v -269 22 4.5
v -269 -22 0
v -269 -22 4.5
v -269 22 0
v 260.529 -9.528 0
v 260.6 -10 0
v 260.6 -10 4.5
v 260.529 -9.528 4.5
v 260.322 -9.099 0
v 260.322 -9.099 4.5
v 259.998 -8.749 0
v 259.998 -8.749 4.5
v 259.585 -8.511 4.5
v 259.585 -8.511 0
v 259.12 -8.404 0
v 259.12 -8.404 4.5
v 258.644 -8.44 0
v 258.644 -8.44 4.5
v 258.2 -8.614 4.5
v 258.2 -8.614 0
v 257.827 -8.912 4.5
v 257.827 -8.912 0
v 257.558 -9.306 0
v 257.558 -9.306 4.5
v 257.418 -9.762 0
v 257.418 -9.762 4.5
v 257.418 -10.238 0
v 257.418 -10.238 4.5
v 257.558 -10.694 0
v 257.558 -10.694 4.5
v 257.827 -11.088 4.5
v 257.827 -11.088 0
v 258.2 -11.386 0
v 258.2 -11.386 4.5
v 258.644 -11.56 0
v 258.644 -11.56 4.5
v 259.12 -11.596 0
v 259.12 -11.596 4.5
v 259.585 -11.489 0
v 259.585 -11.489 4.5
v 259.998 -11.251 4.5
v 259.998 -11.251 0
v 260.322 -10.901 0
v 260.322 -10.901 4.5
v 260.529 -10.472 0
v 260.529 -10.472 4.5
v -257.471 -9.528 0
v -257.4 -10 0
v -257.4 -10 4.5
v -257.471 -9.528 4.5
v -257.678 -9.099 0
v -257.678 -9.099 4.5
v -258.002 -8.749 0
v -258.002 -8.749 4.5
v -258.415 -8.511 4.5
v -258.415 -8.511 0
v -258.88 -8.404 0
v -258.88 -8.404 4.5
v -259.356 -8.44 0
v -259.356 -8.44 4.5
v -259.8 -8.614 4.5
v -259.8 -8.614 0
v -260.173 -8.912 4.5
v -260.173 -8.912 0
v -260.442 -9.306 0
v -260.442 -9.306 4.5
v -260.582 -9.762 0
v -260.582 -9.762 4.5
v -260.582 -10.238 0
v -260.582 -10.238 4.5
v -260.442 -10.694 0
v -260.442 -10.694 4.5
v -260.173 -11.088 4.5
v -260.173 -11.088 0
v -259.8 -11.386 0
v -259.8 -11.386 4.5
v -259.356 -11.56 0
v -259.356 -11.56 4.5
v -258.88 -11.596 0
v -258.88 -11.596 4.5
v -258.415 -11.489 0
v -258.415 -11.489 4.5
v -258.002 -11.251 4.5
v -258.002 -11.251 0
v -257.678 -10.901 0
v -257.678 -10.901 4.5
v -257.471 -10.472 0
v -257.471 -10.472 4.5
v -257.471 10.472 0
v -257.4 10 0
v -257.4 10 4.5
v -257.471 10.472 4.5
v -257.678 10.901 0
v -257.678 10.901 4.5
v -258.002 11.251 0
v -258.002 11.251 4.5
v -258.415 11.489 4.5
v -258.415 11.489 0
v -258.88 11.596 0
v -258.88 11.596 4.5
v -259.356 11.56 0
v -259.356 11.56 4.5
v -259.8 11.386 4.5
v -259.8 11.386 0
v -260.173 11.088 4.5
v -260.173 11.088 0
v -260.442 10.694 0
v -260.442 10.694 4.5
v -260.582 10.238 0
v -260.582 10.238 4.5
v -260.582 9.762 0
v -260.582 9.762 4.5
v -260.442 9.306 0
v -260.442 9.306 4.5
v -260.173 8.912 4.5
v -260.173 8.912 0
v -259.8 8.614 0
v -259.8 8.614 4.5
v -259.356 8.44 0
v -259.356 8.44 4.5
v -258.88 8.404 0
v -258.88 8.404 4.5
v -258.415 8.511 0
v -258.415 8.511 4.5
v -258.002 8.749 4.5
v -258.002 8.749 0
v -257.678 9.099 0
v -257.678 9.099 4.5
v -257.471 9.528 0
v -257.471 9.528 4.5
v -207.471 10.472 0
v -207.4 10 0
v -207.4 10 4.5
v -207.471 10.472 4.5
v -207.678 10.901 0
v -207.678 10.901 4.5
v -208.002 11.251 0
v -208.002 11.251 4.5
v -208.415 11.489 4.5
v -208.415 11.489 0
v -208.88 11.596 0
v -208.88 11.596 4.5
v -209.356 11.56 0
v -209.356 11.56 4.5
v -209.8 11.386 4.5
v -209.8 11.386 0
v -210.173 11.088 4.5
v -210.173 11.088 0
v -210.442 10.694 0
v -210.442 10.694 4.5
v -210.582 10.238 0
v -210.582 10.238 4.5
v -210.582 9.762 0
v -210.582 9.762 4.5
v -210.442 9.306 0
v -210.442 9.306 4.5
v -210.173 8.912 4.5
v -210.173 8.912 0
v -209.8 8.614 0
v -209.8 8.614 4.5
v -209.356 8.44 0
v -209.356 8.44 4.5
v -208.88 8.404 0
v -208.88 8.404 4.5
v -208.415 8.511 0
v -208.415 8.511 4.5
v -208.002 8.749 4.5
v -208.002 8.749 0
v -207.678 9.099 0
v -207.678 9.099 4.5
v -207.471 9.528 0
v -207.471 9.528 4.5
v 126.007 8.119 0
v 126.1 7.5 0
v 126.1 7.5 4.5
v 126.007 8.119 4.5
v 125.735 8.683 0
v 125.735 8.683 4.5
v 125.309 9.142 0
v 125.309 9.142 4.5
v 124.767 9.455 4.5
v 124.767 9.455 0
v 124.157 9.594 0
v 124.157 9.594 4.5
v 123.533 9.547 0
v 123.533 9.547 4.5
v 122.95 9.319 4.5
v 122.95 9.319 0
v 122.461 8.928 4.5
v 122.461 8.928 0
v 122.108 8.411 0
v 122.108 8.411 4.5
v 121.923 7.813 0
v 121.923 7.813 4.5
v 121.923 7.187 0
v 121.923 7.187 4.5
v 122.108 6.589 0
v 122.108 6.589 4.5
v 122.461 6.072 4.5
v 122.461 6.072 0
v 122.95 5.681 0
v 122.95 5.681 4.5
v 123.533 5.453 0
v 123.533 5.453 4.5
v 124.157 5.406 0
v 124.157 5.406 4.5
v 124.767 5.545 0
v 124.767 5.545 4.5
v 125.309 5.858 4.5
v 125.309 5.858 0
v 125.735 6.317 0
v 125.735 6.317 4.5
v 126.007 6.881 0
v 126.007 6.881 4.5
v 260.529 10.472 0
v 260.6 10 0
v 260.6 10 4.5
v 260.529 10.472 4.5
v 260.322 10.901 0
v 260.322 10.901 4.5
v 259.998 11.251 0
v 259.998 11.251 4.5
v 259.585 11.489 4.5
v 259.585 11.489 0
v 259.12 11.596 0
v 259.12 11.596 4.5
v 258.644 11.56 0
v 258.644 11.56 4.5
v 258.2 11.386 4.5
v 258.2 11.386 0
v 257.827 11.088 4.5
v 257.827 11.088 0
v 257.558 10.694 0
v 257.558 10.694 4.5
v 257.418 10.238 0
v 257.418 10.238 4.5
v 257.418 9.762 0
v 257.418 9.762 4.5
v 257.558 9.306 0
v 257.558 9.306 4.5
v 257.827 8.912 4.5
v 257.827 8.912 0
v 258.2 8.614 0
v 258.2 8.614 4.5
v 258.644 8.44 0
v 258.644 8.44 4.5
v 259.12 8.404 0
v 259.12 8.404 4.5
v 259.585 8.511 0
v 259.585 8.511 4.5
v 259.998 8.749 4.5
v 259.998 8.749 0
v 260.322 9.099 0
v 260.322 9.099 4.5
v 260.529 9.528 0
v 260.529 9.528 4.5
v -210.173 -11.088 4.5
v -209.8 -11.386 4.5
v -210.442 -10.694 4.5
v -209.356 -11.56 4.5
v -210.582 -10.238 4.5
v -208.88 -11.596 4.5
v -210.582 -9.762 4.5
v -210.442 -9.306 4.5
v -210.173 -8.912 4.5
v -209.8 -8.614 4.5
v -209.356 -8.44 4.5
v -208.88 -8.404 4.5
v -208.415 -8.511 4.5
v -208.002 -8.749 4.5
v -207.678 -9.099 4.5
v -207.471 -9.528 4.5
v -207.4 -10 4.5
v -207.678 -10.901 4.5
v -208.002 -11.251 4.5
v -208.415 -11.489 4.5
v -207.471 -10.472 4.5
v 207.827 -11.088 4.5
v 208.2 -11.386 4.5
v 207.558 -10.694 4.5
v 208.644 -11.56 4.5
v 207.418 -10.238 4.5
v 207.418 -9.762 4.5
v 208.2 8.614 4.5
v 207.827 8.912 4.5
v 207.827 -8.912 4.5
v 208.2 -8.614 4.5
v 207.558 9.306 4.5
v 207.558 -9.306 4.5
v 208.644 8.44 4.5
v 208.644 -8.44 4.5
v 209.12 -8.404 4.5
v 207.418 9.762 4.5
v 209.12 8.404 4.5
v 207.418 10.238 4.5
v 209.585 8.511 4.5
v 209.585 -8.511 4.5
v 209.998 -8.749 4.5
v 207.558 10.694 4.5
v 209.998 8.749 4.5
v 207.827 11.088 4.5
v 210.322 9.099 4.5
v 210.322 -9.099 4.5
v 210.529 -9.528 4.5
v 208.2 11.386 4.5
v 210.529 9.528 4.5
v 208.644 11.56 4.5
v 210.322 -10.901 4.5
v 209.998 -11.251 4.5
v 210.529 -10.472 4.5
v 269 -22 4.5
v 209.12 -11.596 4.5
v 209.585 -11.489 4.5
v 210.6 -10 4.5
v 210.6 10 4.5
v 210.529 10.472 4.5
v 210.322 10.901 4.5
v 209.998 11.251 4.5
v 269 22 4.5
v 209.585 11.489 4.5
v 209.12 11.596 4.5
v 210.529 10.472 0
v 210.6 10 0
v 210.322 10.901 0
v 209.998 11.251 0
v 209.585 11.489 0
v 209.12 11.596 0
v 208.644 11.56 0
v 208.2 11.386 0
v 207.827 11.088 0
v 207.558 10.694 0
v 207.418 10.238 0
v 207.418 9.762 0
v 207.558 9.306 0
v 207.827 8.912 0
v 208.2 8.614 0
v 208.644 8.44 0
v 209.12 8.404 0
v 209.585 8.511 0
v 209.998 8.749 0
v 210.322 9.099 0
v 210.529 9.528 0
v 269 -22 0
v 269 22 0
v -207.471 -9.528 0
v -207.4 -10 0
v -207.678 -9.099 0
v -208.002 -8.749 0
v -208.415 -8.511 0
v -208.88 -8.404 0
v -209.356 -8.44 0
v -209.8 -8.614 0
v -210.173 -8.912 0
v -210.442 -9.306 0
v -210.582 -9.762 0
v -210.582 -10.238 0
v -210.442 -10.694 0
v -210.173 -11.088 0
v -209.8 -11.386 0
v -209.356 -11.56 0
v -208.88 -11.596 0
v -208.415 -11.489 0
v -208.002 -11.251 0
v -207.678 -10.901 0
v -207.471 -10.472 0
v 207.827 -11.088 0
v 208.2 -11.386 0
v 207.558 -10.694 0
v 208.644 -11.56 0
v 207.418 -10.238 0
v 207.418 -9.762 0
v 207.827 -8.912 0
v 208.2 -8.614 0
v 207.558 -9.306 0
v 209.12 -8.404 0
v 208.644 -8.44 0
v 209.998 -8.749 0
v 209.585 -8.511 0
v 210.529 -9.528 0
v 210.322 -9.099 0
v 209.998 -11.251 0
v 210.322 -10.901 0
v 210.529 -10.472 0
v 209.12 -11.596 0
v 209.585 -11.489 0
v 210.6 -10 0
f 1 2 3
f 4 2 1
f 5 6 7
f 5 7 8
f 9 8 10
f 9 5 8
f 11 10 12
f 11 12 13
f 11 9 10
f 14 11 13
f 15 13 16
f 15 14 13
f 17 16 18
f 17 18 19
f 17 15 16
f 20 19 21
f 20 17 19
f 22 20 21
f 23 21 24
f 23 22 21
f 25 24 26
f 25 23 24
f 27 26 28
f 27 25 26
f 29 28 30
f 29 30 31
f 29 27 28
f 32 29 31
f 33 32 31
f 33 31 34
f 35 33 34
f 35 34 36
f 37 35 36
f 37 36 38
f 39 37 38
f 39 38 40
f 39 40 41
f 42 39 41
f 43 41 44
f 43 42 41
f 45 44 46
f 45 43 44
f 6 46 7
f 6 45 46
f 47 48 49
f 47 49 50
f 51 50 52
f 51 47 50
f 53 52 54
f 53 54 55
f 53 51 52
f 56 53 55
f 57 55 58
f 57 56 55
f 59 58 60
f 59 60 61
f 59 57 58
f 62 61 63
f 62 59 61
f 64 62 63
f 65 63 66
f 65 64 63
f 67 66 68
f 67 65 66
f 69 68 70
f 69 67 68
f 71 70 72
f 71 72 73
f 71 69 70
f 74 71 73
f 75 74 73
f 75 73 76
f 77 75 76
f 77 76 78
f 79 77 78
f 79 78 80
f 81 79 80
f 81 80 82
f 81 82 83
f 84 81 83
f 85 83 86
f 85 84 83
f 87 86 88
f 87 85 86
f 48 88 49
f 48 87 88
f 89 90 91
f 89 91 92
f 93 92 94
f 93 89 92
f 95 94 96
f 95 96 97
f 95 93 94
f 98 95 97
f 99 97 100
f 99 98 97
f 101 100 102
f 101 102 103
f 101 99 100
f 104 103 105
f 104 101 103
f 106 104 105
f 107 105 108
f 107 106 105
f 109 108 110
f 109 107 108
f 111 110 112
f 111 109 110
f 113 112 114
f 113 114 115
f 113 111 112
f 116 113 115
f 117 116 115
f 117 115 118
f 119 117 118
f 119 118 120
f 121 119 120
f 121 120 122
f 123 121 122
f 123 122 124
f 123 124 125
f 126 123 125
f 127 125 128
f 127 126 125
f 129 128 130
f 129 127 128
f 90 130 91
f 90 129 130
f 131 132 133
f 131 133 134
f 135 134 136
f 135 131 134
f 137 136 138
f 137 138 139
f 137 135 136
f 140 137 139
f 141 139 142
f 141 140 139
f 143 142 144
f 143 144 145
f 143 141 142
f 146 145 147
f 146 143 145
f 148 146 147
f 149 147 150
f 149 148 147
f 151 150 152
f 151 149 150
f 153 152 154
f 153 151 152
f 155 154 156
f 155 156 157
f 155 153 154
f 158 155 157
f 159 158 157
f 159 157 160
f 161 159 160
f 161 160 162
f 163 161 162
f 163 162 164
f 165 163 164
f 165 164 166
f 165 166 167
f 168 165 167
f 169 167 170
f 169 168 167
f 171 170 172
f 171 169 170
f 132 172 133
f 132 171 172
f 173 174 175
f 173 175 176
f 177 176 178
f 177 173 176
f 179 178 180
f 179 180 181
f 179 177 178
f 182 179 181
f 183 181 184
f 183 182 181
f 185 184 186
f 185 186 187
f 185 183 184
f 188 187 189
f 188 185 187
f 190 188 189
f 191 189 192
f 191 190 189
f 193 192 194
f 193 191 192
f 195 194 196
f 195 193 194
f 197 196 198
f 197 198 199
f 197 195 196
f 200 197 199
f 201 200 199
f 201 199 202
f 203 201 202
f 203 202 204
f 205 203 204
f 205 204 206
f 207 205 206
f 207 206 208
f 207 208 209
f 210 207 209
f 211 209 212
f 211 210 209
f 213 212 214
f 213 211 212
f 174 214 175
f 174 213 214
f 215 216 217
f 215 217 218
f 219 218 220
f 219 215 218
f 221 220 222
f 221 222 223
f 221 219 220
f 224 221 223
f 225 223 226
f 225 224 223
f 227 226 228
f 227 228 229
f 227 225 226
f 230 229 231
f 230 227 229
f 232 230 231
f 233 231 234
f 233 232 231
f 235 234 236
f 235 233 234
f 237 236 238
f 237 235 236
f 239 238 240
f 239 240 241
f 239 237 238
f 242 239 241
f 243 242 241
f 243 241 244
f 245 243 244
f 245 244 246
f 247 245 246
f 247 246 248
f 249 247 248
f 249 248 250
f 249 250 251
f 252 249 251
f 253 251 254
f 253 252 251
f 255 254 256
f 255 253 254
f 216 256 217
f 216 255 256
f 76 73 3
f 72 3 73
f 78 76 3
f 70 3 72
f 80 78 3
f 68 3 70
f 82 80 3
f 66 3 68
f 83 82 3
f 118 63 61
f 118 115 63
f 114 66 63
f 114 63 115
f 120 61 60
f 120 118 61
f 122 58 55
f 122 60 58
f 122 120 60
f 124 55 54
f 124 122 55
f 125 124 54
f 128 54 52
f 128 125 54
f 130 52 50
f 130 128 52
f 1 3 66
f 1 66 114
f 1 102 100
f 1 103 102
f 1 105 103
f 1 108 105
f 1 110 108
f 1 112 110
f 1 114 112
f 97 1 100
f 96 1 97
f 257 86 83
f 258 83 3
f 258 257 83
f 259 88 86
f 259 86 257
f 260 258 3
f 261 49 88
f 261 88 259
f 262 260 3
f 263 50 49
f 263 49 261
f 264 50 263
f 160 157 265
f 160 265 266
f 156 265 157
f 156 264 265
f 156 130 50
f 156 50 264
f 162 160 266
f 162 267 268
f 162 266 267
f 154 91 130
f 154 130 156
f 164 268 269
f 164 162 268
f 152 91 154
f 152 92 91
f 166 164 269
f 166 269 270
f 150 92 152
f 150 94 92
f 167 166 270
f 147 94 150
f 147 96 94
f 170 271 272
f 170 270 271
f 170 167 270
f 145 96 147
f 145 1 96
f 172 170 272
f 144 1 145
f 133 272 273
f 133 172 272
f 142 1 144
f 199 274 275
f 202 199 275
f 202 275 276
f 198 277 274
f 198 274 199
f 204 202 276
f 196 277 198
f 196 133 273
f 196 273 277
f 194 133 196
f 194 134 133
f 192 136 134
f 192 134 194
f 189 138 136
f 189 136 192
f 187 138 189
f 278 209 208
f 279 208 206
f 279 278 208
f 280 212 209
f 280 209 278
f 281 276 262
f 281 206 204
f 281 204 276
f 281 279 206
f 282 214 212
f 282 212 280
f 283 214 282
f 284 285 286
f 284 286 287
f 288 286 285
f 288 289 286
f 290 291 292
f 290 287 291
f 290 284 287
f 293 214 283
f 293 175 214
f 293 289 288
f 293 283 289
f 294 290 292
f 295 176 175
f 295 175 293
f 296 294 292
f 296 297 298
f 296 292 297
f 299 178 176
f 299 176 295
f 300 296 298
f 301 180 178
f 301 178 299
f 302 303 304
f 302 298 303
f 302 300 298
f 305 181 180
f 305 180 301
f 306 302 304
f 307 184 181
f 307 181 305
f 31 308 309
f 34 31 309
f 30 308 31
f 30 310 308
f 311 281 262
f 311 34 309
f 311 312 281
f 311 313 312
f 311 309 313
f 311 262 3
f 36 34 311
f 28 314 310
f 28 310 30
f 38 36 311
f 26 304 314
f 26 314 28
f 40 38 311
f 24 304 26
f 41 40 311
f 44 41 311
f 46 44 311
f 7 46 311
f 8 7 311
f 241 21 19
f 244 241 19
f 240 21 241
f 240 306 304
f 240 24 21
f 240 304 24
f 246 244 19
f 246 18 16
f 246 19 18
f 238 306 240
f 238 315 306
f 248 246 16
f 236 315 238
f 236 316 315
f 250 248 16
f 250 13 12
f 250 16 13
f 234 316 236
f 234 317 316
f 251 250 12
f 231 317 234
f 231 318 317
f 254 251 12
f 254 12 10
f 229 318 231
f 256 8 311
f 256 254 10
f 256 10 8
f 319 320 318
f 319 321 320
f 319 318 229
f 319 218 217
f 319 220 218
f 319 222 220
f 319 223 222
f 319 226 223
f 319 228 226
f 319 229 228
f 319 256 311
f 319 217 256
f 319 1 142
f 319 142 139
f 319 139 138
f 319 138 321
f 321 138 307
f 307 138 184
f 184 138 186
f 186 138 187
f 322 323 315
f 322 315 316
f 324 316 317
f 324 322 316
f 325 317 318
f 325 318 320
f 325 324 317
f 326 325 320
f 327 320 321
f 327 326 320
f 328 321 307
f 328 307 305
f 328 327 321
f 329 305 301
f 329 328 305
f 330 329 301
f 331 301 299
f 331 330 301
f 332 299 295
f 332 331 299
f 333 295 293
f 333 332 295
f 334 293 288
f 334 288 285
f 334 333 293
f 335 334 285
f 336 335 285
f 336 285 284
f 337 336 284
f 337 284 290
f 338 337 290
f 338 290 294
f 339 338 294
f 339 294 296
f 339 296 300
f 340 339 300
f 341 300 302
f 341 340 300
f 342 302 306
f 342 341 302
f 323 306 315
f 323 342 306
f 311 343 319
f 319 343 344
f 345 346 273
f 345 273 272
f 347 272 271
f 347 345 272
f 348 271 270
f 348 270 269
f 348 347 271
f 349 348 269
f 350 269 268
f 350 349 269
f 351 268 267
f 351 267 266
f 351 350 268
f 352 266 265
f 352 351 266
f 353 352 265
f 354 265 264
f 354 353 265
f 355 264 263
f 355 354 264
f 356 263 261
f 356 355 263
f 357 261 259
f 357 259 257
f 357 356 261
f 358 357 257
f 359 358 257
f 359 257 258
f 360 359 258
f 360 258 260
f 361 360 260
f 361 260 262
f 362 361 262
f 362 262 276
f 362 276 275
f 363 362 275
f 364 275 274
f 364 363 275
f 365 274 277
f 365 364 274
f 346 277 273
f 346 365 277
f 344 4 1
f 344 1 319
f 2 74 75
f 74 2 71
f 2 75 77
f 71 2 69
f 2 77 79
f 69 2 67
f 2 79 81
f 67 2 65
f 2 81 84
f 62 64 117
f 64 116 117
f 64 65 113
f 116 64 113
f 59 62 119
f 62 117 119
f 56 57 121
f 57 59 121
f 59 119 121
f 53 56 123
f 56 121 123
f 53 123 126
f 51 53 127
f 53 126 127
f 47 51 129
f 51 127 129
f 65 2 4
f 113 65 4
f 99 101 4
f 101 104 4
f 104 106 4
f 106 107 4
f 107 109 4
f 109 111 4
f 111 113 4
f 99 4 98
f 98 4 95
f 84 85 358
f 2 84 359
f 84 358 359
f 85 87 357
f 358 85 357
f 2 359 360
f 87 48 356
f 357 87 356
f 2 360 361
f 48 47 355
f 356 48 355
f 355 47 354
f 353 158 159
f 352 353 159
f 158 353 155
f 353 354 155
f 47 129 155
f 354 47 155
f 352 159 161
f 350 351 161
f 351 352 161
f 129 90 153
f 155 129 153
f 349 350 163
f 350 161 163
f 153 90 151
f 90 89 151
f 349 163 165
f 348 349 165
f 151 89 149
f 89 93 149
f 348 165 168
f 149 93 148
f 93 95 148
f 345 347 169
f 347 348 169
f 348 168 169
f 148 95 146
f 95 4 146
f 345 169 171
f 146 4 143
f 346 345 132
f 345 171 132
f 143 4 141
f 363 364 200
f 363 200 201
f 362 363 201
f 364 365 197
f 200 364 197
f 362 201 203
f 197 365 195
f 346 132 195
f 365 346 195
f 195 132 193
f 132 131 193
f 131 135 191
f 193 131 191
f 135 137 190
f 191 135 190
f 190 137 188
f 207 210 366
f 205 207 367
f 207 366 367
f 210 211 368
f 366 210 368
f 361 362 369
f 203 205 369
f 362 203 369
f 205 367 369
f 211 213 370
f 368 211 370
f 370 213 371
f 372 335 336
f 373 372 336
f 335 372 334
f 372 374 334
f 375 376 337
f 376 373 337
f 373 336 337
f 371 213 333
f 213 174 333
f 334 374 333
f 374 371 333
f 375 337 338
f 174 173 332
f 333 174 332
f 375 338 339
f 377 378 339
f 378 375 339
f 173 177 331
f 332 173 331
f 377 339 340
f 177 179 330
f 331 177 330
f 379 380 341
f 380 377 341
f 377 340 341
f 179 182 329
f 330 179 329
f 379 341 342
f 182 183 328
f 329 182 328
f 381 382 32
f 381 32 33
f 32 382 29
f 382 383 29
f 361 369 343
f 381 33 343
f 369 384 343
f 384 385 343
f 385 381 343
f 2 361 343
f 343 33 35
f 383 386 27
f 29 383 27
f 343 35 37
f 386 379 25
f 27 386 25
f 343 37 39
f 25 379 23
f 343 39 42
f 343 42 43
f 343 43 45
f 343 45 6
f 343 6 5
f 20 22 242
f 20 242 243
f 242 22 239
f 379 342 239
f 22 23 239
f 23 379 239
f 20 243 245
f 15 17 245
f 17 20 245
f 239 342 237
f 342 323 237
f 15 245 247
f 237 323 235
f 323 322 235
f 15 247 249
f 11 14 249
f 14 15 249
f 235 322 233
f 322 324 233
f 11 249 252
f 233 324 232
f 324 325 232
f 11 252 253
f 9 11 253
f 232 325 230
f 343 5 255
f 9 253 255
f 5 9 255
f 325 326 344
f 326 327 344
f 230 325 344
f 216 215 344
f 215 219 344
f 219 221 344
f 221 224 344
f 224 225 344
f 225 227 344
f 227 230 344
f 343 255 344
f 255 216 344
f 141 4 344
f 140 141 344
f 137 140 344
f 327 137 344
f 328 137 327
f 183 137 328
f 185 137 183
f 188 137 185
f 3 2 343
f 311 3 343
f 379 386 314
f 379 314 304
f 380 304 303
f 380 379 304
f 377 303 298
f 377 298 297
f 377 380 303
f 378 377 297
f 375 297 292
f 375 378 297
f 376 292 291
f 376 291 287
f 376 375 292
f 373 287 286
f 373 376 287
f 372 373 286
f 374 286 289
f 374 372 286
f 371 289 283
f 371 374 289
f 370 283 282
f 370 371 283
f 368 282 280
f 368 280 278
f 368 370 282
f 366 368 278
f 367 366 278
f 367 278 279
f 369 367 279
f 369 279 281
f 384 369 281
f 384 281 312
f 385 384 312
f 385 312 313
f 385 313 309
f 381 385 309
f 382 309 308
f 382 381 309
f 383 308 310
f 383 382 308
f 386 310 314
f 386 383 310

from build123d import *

# Parameters (mm, degrees)
SKETCH2_W           = 538
SKETCH2_H           = 44
SKETCH2_R           = 2.1
SKETCH2_R_2         = 1.6
BOSS_EXTRUDE1_DEPTH = 4.5


with BuildPart() as part:
    # Sketch2 → Boss-Extrude1 (new body)
    with BuildSketch(Plane.XY):
        Rectangle(SKETCH2_W, SKETCH2_H)
        with Locations((124, 7.5)):
            Circle(SKETCH2_R, mode=Mode.SUBTRACT)
        with Locations((259, 10)):
            Circle(SKETCH2_R_2, mode=Mode.SUBTRACT)
        with Locations((209, 10)):
            Circle(SKETCH2_R_2, mode=Mode.SUBTRACT)
        with Locations((209, -10)):
            Circle(SKETCH2_R_2, mode=Mode.SUBTRACT)
        with Locations((259, -10)):
            Circle(SKETCH2_R_2, mode=Mode.SUBTRACT)
        with Locations((-209, 10)):
            Circle(SKETCH2_R_2, mode=Mode.SUBTRACT)
        with Locations((-209, -10)):
            Circle(SKETCH2_R_2, mode=Mode.SUBTRACT)
        with Locations((-259, -10)):
            Circle(SKETCH2_R_2, mode=Mode.SUBTRACT)
        with Locations((-259, 10)):
            Circle(SKETCH2_R_2, mode=Mode.SUBTRACT)
    extrude(amount=BOSS_EXTRUDE1_DEPTH)


solid = part.part
